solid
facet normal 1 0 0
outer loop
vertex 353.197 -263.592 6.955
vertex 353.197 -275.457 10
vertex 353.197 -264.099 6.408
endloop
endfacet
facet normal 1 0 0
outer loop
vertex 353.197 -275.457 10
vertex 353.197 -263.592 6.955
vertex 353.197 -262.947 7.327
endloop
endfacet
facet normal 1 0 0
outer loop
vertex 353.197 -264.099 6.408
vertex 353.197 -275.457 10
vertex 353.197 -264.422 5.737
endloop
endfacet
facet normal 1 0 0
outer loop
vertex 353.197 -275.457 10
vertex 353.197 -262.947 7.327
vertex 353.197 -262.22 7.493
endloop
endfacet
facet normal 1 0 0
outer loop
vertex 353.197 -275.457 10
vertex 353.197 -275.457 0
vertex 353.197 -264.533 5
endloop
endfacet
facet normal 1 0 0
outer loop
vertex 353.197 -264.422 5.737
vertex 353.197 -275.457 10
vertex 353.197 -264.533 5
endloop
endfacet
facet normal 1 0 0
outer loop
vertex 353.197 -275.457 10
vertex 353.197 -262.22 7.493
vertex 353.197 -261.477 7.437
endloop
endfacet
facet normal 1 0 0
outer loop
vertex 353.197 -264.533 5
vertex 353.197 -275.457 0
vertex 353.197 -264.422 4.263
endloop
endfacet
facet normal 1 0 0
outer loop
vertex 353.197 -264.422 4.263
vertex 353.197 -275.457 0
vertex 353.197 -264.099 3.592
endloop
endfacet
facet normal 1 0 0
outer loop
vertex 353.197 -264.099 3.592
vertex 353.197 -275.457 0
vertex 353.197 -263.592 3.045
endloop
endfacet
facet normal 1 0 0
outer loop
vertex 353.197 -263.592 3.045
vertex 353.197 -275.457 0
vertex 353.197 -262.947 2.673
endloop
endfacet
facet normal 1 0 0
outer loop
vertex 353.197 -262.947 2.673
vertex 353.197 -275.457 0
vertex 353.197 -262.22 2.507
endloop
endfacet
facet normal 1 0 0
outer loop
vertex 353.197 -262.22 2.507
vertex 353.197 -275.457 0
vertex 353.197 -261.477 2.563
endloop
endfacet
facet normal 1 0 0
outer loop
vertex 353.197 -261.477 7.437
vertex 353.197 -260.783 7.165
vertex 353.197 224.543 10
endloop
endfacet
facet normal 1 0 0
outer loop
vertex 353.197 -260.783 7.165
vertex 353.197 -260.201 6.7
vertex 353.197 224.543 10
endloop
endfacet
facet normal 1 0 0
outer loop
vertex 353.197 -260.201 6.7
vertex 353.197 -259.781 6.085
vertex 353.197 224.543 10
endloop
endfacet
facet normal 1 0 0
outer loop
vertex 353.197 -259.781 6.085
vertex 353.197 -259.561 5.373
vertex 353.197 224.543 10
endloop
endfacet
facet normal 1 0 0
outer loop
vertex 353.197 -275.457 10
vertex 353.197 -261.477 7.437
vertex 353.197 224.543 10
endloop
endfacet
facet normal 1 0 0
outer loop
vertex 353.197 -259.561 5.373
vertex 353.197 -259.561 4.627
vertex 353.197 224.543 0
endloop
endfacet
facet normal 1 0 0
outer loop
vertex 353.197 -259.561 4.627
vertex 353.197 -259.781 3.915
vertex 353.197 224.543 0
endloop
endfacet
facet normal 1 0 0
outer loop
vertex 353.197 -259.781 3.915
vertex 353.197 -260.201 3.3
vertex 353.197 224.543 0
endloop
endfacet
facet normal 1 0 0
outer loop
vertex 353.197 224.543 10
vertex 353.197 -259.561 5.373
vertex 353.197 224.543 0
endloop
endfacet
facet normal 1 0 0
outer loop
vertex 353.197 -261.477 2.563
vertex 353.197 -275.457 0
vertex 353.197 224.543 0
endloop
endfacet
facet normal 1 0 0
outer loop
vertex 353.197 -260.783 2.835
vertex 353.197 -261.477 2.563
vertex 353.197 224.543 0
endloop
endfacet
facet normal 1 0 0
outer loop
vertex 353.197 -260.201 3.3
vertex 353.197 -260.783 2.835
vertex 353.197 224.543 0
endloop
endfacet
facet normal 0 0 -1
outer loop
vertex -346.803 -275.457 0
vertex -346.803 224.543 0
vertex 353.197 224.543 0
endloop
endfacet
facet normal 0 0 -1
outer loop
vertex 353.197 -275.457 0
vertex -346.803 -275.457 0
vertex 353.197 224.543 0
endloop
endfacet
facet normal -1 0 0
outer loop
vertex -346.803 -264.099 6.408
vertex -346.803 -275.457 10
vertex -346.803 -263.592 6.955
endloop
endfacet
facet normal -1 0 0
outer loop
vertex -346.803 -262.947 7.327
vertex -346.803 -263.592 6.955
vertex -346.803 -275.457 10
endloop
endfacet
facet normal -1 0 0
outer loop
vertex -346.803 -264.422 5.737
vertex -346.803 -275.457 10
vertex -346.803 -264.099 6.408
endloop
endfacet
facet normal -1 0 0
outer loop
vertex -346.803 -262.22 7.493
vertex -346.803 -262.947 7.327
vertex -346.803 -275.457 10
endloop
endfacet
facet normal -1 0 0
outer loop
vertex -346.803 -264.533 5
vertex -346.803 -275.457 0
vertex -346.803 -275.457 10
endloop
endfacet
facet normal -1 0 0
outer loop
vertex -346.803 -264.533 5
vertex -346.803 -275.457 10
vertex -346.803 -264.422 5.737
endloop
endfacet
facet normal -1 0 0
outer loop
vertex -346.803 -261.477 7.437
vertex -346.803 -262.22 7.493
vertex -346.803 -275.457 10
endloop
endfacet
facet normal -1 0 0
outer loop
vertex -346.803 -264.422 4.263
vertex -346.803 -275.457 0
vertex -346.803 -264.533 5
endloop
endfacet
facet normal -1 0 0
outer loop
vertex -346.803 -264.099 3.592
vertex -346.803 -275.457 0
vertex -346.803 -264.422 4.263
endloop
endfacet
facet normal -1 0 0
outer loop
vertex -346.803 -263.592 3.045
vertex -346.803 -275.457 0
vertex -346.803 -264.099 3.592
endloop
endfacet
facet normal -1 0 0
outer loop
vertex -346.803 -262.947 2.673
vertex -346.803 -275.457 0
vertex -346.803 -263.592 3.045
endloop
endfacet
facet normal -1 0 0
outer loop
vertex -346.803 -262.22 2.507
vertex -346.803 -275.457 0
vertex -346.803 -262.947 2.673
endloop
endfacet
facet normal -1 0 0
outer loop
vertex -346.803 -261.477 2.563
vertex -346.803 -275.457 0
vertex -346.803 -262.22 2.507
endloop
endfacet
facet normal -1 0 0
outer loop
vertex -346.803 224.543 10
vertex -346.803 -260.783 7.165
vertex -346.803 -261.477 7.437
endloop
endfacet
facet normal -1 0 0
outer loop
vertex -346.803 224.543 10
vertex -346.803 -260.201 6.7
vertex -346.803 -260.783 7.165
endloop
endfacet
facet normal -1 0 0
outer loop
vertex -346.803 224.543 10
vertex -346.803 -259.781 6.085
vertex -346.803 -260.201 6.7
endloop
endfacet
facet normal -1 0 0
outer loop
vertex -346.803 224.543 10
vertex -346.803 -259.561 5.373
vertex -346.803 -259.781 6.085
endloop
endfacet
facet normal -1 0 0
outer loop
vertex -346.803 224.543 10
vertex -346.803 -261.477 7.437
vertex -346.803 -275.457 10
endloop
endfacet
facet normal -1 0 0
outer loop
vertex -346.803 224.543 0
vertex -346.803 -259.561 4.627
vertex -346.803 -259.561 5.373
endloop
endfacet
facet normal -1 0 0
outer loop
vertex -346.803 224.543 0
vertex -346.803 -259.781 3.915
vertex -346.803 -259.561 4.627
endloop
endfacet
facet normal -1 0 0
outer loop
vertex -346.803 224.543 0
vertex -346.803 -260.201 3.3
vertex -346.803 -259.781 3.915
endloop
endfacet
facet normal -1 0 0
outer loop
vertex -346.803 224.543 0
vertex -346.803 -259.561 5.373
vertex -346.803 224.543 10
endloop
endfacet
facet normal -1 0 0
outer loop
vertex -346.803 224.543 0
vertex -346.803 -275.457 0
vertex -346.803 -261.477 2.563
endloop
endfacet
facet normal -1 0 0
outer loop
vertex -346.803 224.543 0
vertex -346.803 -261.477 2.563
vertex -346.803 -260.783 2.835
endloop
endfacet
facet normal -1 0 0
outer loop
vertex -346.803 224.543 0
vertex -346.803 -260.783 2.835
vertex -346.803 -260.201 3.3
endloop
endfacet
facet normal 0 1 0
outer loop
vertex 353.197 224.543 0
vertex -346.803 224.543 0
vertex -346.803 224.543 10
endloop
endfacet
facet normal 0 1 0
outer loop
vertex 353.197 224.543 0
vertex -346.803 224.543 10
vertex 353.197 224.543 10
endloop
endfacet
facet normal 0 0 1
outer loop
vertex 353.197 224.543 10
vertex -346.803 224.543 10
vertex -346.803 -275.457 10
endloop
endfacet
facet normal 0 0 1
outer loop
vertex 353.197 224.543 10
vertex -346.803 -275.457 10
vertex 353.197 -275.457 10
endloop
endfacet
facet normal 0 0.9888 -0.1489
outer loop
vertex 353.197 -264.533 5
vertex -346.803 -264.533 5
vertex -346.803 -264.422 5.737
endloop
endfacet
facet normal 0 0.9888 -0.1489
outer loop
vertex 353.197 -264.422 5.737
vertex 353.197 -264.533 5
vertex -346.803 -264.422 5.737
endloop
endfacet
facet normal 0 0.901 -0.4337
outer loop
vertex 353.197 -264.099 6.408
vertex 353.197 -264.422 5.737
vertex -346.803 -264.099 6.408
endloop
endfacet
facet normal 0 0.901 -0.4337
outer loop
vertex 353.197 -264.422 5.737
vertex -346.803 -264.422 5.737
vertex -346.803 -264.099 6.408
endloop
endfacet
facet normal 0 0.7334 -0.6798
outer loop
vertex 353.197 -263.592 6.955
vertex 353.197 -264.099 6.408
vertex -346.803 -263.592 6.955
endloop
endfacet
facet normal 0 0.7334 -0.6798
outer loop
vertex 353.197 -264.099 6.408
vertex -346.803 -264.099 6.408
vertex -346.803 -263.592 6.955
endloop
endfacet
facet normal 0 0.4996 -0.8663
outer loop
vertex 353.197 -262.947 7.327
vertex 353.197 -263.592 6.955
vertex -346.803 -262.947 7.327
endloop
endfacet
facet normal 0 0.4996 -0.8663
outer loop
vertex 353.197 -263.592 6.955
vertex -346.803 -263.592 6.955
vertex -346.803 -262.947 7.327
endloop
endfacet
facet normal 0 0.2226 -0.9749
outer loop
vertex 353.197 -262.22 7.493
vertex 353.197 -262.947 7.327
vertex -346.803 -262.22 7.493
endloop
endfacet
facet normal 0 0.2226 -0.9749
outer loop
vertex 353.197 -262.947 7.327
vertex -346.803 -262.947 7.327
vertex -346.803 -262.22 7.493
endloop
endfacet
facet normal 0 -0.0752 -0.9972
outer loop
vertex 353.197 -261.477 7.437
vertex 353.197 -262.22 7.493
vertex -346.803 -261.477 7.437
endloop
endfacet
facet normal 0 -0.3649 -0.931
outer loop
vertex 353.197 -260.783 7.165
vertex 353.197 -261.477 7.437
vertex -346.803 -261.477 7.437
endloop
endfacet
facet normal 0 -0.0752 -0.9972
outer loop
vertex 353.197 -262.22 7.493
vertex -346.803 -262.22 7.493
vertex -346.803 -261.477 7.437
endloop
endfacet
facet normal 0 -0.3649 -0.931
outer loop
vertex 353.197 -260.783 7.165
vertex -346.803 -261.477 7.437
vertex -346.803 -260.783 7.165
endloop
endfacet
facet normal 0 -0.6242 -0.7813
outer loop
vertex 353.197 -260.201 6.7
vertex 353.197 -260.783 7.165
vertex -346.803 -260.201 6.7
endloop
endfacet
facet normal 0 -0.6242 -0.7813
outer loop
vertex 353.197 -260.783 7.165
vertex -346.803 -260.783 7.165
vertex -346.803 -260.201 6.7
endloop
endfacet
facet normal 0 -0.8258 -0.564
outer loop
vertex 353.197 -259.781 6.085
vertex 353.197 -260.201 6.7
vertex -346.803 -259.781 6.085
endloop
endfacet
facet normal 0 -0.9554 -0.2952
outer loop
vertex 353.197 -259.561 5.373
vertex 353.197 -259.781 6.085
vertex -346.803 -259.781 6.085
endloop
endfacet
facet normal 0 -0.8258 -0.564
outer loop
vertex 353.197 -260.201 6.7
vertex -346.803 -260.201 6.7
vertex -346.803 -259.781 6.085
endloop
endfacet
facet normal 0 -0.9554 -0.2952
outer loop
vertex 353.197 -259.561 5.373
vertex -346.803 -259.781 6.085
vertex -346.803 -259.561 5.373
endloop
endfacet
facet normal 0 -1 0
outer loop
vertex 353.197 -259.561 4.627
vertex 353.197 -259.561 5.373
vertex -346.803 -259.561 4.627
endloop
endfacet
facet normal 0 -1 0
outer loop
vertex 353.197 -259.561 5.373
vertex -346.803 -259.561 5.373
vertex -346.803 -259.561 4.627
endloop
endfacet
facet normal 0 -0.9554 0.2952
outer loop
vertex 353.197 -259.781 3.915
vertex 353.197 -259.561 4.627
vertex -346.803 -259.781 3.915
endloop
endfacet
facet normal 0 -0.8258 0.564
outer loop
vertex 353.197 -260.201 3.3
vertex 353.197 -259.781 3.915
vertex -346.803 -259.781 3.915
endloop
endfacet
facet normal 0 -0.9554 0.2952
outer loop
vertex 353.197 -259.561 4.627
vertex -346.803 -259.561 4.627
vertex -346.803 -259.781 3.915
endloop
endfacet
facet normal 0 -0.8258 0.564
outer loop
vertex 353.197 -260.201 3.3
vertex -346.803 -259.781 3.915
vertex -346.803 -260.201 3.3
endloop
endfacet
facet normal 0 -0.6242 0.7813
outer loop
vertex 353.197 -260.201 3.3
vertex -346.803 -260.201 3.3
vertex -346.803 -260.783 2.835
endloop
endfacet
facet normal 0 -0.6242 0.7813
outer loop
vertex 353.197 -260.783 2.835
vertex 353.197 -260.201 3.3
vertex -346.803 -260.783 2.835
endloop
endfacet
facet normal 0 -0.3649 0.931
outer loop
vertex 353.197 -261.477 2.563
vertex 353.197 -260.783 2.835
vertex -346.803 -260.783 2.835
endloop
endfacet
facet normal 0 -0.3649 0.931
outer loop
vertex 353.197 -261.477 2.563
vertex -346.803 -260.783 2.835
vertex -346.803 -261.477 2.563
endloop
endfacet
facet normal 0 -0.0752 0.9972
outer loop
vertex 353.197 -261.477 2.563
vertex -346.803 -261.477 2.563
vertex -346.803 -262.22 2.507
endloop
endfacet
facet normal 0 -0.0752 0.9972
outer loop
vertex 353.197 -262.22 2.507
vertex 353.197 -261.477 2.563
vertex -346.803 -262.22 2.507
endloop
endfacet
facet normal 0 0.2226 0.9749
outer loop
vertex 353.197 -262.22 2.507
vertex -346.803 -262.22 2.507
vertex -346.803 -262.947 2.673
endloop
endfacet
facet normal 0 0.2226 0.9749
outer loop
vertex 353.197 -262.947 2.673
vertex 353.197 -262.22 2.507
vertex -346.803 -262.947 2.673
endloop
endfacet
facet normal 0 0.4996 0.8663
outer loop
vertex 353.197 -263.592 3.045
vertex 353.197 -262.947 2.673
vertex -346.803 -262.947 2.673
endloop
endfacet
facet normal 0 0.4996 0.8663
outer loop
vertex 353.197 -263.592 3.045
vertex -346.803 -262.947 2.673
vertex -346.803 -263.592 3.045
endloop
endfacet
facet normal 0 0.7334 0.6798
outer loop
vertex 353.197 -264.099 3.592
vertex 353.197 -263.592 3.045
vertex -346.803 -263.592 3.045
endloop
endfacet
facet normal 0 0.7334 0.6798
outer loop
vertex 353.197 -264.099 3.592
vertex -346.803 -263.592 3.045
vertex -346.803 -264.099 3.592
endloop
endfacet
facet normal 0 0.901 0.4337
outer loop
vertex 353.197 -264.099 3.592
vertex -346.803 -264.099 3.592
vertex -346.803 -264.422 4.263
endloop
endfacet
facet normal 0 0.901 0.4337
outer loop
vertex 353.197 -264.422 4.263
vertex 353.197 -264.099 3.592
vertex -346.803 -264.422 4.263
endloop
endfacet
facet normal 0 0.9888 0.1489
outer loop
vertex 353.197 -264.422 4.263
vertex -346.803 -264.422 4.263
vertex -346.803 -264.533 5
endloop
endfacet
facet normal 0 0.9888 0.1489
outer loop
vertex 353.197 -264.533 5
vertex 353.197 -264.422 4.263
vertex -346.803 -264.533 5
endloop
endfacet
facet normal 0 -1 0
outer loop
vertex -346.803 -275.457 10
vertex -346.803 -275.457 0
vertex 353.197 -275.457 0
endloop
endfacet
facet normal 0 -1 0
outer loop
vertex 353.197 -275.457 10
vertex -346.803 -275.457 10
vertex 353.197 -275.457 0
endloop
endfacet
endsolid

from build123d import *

# Parameters (mm, degrees)
F0_W     = 700
F0_H     = 500
F1_DEPTH = 10
F2_R     = 4.150796
F3_DEPTH = 700
F5_D     = 5


with BuildPart() as f1:
    # F0 (on Top) → F1 (new body)
    with BuildSketch(Plane.XY):
        with Locations((3.196869, -25.456903)):
            Rectangle(F0_W, F0_H)
    extrude(amount=F1_DEPTH)

    # F2 (on face) → F3 (join)
    with BuildSketch(Plane.YZ.offset(353.196869)):
        with Locations((-266.181707, 5.849204)):
            Circle(F2_R)
    extrude(amount=-F3_DEPTH)

    # F5 (through all)
    with Locations(Plane.YZ.offset(353.196869)):
        with Locations((-262.033492, 5)):
            Hole(F5_D / 2)


solid = f1.part
